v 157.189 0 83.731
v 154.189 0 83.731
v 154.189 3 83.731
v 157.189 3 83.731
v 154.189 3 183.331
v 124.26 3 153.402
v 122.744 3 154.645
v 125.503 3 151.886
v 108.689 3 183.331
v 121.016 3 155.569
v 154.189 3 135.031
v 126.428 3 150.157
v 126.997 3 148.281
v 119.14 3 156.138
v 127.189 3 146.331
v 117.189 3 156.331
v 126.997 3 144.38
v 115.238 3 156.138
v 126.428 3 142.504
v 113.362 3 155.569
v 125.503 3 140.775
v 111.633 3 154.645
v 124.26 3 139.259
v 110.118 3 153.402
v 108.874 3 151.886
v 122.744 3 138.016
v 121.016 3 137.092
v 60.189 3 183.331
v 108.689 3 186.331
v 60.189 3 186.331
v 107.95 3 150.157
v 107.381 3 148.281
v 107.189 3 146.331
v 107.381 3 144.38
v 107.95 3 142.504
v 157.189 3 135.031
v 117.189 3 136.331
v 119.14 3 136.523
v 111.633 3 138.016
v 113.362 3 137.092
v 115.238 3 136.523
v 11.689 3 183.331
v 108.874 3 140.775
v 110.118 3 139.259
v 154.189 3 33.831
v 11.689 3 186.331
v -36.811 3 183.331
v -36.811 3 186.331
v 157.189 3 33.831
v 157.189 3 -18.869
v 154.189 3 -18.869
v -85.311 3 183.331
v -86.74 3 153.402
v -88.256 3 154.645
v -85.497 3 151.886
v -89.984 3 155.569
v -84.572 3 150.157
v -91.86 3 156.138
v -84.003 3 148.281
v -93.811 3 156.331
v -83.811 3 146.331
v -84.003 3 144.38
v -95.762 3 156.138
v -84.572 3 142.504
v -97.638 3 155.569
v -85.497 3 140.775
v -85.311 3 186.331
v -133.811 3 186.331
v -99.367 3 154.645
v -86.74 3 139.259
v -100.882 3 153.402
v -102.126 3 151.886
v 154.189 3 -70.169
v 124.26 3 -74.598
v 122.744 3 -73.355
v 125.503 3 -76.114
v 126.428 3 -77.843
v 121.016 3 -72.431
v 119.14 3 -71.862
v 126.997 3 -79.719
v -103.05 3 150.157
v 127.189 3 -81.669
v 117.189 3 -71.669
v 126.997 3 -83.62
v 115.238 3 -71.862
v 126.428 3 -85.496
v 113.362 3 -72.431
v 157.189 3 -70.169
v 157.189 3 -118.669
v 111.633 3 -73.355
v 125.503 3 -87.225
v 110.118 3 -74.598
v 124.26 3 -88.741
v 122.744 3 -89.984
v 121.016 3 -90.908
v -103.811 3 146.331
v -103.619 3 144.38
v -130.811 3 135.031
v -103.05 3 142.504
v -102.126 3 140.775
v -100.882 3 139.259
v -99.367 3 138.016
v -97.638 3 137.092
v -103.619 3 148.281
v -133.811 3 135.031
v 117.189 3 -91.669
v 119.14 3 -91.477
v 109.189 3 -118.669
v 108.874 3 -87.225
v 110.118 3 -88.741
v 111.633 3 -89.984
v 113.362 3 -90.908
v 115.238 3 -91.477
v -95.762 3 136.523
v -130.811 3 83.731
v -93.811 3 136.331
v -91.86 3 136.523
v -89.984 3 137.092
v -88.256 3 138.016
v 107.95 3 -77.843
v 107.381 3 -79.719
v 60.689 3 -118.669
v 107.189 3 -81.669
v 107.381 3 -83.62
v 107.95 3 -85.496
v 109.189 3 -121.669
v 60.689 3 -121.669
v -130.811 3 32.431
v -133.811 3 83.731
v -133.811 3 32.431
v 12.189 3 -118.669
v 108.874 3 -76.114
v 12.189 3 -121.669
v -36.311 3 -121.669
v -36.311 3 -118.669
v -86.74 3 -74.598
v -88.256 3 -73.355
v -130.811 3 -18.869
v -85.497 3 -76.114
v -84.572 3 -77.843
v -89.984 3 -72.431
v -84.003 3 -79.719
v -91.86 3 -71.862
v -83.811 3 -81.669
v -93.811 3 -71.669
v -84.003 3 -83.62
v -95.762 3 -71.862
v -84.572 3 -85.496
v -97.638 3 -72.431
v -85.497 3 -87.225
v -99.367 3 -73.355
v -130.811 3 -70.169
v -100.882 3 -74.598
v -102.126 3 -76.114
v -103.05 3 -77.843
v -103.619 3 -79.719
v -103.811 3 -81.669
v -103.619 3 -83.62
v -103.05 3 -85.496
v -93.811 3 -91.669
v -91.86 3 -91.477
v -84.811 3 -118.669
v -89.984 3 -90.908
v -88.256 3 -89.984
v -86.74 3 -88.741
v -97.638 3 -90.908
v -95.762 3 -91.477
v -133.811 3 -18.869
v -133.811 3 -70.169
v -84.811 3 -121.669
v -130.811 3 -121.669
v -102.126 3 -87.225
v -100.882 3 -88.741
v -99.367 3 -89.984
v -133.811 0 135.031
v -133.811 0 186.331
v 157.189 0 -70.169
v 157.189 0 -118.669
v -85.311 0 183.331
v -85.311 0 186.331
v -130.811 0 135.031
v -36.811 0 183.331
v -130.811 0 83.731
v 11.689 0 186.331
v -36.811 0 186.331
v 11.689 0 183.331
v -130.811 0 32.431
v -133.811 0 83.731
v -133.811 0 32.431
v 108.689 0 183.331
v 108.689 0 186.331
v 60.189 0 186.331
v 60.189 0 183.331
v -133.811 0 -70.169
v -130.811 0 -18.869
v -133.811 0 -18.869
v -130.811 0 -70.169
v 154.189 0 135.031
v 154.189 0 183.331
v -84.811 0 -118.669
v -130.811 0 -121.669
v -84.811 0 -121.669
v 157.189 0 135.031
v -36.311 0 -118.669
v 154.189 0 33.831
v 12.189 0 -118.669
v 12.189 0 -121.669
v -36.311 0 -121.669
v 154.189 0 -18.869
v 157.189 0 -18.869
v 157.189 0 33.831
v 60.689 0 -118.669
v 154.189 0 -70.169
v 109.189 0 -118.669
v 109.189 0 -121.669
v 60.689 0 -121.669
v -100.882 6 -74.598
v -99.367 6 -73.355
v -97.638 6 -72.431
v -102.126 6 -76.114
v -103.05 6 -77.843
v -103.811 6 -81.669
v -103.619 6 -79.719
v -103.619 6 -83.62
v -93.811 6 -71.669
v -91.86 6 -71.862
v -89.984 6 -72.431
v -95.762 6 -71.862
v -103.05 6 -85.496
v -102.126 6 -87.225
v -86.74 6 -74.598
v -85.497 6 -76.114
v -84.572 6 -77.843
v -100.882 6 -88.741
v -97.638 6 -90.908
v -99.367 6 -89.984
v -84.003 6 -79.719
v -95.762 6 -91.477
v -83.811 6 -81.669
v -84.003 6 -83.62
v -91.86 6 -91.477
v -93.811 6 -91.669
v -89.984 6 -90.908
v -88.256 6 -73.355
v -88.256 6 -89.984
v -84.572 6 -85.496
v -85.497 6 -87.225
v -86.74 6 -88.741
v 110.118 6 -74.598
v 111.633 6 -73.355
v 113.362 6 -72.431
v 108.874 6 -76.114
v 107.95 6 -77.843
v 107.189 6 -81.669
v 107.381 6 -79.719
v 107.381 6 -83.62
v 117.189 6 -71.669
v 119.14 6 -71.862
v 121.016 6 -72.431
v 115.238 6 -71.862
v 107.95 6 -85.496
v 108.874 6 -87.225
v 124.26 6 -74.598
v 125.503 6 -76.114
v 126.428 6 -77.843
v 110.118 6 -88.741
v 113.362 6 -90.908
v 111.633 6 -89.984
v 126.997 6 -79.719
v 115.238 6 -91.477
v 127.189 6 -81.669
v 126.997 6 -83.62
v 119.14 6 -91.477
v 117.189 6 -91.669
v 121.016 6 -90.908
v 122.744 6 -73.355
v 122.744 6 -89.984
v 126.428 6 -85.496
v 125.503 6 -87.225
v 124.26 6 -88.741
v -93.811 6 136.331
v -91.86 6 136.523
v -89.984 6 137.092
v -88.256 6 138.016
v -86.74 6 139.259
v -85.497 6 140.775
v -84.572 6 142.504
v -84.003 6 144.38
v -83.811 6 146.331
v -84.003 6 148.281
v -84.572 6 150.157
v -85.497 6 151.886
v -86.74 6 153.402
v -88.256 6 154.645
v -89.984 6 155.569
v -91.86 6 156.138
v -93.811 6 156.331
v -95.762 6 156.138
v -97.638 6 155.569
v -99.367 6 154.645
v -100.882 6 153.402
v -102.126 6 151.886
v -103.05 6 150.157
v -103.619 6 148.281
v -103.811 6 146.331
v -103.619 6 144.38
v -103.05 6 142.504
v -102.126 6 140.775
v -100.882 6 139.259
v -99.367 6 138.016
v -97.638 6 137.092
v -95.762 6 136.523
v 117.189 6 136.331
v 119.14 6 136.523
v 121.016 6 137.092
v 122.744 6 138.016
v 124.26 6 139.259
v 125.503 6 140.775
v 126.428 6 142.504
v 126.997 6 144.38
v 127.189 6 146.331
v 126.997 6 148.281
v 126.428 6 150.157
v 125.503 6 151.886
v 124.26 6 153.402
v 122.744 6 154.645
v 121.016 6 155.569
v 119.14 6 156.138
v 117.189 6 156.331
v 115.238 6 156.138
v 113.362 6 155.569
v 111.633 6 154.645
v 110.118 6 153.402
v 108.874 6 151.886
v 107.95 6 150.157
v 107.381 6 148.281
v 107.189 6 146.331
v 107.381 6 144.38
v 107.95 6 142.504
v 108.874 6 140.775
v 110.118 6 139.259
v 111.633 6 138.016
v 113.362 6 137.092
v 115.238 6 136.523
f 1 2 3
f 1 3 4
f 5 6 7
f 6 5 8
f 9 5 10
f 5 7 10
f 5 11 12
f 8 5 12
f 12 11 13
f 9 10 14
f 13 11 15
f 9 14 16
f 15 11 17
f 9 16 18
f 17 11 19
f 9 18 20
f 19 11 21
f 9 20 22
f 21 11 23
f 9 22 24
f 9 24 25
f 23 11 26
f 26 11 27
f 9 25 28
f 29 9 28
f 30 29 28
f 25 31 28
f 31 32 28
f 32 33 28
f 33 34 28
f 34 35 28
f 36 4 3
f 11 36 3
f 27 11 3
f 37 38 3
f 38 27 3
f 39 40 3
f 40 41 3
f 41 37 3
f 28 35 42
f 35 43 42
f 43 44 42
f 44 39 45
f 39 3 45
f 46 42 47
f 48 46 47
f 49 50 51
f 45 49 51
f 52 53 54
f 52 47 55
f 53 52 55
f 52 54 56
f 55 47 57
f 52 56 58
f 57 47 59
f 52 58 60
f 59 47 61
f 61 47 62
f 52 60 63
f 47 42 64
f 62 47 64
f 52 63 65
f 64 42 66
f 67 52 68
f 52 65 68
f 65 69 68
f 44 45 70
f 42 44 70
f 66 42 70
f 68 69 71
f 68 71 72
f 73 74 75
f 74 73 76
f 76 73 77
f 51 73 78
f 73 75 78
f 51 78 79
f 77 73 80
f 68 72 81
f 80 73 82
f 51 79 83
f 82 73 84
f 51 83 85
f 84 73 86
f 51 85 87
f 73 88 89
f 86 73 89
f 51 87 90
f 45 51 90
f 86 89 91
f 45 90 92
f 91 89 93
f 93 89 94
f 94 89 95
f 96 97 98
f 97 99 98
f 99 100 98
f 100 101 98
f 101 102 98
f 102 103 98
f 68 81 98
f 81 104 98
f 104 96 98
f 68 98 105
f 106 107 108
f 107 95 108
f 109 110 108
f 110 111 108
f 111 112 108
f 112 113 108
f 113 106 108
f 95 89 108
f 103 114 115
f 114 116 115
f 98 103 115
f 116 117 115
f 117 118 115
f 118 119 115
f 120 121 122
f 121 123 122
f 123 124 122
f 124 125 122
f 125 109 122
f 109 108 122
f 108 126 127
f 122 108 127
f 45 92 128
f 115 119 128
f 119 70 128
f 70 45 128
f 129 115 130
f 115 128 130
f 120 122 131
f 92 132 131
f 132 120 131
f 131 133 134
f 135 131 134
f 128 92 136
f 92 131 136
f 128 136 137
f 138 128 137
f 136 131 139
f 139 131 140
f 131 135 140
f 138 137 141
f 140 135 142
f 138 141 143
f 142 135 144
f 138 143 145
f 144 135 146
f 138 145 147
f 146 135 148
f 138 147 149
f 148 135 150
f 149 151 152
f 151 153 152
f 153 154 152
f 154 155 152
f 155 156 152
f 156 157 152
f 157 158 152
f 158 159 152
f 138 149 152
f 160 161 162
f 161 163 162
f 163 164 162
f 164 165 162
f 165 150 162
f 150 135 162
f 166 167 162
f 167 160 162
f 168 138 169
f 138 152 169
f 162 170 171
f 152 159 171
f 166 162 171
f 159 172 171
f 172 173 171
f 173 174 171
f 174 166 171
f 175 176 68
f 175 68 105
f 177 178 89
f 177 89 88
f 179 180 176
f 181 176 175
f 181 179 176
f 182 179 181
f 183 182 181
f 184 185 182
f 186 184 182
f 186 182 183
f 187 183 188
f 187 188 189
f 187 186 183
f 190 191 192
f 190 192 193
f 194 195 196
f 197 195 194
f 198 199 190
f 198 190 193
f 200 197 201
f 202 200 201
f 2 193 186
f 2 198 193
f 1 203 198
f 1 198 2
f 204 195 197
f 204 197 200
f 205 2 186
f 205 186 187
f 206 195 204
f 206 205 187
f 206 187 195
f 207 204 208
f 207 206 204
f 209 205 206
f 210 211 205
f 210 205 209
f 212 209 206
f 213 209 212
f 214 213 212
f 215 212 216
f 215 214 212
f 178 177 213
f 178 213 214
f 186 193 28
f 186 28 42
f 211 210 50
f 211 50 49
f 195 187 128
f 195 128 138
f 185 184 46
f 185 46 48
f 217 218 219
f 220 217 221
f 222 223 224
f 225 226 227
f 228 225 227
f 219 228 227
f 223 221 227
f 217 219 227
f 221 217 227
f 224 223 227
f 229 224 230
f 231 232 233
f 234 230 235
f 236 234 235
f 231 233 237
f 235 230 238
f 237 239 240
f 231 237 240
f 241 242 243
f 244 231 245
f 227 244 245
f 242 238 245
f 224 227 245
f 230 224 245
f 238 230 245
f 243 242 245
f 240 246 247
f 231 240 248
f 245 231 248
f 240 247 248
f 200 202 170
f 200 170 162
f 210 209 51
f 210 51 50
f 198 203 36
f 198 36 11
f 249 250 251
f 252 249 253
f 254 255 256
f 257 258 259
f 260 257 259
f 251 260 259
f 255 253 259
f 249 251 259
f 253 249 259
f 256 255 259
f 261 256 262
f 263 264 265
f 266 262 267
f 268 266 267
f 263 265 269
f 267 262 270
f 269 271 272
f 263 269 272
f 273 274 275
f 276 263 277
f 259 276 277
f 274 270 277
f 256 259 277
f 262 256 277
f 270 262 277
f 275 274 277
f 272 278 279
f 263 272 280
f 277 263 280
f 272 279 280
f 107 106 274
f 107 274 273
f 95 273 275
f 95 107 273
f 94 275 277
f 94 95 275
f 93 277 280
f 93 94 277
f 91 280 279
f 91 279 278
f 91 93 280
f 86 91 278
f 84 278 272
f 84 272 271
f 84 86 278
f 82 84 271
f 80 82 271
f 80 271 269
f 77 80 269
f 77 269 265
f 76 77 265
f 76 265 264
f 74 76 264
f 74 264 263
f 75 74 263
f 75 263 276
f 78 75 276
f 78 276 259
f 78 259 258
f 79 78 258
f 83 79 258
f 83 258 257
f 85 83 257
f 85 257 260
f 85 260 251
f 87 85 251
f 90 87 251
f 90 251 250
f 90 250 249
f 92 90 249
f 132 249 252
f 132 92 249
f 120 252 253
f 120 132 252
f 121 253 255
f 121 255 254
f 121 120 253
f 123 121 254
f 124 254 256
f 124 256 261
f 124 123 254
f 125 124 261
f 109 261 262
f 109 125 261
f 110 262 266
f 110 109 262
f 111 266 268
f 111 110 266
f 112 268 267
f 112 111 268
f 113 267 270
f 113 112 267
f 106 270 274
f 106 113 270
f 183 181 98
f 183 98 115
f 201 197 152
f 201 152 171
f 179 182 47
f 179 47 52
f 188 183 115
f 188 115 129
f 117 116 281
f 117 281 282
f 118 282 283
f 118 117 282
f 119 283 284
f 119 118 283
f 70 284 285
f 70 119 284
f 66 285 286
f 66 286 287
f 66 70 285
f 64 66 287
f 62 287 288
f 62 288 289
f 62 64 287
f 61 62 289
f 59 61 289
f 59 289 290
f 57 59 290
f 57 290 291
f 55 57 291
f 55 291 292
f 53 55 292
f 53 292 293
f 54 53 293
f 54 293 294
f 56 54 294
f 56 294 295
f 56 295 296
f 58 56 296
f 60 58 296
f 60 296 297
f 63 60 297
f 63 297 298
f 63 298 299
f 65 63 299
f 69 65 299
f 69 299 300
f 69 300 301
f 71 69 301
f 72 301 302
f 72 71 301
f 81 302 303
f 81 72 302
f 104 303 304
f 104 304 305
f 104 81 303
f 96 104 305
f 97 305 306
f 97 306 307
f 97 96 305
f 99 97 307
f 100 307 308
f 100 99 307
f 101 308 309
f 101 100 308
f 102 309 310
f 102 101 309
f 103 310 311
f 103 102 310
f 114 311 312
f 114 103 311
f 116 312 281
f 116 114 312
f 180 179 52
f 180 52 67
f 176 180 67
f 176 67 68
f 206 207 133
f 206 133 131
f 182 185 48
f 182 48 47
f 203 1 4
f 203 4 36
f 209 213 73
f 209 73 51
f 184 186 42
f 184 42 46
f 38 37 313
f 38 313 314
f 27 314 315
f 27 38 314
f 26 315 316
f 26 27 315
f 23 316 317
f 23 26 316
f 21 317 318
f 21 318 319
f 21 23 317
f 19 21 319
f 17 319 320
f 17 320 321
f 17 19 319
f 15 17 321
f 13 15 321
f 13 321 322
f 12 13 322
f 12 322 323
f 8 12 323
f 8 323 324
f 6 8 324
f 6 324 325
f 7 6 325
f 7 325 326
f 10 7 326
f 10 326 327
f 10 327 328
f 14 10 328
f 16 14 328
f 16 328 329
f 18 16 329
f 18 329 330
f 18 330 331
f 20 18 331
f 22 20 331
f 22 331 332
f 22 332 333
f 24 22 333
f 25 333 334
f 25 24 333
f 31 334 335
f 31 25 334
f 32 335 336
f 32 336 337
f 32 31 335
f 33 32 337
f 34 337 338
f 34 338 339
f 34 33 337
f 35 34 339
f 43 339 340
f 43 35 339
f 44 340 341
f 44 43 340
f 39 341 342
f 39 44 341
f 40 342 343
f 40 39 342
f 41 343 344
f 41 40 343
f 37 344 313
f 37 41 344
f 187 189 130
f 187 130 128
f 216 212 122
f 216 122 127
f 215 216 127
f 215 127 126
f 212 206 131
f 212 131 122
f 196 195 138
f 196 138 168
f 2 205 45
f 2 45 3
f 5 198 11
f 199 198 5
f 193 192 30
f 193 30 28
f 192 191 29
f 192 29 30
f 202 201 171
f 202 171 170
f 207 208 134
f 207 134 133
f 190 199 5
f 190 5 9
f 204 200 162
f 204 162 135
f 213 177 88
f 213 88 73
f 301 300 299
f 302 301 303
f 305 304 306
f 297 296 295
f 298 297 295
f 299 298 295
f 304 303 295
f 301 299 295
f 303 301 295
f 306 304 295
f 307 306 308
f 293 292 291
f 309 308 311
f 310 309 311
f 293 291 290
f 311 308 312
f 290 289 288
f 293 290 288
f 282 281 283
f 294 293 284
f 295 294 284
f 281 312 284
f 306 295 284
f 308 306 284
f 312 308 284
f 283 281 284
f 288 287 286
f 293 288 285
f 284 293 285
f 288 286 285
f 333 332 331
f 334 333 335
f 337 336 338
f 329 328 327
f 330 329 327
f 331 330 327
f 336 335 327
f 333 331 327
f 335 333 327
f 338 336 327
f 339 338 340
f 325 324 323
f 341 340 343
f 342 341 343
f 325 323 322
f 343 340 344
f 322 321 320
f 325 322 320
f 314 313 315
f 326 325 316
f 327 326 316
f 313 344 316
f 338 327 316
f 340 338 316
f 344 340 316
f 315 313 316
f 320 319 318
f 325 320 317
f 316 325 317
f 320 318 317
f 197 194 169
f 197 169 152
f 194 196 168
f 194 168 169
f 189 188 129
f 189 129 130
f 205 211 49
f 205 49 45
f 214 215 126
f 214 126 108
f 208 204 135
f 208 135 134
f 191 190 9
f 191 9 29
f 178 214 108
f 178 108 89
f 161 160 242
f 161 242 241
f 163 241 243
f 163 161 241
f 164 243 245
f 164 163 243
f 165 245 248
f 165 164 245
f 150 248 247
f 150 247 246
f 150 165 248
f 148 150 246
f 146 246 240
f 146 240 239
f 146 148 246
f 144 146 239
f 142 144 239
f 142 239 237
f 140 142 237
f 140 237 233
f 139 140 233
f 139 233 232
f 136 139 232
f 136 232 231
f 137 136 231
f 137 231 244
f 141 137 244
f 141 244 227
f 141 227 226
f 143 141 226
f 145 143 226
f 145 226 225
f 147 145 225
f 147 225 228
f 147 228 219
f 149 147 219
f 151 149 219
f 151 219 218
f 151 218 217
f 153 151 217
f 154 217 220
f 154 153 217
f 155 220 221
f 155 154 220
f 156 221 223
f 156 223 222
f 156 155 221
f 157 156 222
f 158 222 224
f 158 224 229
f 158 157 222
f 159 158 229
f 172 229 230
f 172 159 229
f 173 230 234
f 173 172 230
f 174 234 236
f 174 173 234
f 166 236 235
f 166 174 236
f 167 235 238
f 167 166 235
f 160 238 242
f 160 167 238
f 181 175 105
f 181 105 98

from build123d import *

# Parameters (mm, degrees)
EXTRUDE_1_DEPTH = 3
SKETCH_2_R      = 10
EXTRUDE_3_DEPTH = 6


with BuildPart() as part:
    # Эскиз1 → Бобышка-Вытянуть1 (new body)
    with BuildSketch(Plane(origin=(0, 0, 0), x_dir=(1, 0, 0), z_dir=(0, 1, 0))):
        Polygon((-130.811243507, 121.669438521), (-84.811243507, 121.669438521), (-84.811243507, 118.669438521), (-36.311243507, 118.669438521), (-36.311243507, 121.669438521), (12.188756493, 121.669438521), (12.188756493, 118.669438521), (60.688756493, 118.669438521), (60.688756493, 121.669438521), (109.188756493, 121.669438521), (109.188756493, 118.669438521), (157.188756493, 118.669438521), (157.188756493, 70.169438521), (154.188756493, 70.169438521), (154.188756493, 18.869438521), (157.188756493, 18.869438521), (157.188756493, -33.830561479), (154.188756493, -33.830561479), (154.188756493, -83.730561479), (157.188756493, -83.730561479), (157.188756493, -135.030561479), (154.188756493, -135.030561479), (154.188756493, -183.330561479), (108.688756493, -183.330561479), (108.688756493, -186.330561479), (60.188756493, -186.330561479), (60.188756493, -183.330561479), (11.688756493, -183.330561479), (11.688756493, -186.330561479), (-36.811243507, -186.330561479), (-36.811243507, -183.330561479), (-85.311243507, -183.330561479), (-85.311243507, -186.330561479), (-133.811243507, -186.330561479), (-133.811243507, -135.030561479), (-130.811243507, -135.030561479), (-130.811243507, -83.730561479), (-133.811243507, -83.730561479), (-133.811243507, -32.430561479), (-130.811243507, -32.430561479), (-130.811243507, 18.869438521), (-133.811243507, 18.869438521), (-133.811243507, 70.169438521), (-130.811243507, 70.169438521), align=None)
    extrude(amount=EXTRUDE_1_DEPTH)

    # Эскиз2 → Бобышка-Вытянуть3 (add)
    with BuildSketch(Plane.XZ):
        with Locations(Location((-93.811243507, 146.330561479, 0), (0, 0, 270))):
            Circle(SKETCH_2_R)
        with Locations(Location((117.188756493, 146.330561479, 0), (0, 0, 270))):
            Circle(SKETCH_2_R)
        with Locations(Location((117.188756493, -81.669438521, 0), (0, 0, 270))):
            Circle(SKETCH_2_R)
        with Locations(Location((-93.811243507, -81.669438521, 0), (0, 0, 270))):
            Circle(SKETCH_2_R)
    extrude(amount=-EXTRUDE_3_DEPTH)


solid = part.part
